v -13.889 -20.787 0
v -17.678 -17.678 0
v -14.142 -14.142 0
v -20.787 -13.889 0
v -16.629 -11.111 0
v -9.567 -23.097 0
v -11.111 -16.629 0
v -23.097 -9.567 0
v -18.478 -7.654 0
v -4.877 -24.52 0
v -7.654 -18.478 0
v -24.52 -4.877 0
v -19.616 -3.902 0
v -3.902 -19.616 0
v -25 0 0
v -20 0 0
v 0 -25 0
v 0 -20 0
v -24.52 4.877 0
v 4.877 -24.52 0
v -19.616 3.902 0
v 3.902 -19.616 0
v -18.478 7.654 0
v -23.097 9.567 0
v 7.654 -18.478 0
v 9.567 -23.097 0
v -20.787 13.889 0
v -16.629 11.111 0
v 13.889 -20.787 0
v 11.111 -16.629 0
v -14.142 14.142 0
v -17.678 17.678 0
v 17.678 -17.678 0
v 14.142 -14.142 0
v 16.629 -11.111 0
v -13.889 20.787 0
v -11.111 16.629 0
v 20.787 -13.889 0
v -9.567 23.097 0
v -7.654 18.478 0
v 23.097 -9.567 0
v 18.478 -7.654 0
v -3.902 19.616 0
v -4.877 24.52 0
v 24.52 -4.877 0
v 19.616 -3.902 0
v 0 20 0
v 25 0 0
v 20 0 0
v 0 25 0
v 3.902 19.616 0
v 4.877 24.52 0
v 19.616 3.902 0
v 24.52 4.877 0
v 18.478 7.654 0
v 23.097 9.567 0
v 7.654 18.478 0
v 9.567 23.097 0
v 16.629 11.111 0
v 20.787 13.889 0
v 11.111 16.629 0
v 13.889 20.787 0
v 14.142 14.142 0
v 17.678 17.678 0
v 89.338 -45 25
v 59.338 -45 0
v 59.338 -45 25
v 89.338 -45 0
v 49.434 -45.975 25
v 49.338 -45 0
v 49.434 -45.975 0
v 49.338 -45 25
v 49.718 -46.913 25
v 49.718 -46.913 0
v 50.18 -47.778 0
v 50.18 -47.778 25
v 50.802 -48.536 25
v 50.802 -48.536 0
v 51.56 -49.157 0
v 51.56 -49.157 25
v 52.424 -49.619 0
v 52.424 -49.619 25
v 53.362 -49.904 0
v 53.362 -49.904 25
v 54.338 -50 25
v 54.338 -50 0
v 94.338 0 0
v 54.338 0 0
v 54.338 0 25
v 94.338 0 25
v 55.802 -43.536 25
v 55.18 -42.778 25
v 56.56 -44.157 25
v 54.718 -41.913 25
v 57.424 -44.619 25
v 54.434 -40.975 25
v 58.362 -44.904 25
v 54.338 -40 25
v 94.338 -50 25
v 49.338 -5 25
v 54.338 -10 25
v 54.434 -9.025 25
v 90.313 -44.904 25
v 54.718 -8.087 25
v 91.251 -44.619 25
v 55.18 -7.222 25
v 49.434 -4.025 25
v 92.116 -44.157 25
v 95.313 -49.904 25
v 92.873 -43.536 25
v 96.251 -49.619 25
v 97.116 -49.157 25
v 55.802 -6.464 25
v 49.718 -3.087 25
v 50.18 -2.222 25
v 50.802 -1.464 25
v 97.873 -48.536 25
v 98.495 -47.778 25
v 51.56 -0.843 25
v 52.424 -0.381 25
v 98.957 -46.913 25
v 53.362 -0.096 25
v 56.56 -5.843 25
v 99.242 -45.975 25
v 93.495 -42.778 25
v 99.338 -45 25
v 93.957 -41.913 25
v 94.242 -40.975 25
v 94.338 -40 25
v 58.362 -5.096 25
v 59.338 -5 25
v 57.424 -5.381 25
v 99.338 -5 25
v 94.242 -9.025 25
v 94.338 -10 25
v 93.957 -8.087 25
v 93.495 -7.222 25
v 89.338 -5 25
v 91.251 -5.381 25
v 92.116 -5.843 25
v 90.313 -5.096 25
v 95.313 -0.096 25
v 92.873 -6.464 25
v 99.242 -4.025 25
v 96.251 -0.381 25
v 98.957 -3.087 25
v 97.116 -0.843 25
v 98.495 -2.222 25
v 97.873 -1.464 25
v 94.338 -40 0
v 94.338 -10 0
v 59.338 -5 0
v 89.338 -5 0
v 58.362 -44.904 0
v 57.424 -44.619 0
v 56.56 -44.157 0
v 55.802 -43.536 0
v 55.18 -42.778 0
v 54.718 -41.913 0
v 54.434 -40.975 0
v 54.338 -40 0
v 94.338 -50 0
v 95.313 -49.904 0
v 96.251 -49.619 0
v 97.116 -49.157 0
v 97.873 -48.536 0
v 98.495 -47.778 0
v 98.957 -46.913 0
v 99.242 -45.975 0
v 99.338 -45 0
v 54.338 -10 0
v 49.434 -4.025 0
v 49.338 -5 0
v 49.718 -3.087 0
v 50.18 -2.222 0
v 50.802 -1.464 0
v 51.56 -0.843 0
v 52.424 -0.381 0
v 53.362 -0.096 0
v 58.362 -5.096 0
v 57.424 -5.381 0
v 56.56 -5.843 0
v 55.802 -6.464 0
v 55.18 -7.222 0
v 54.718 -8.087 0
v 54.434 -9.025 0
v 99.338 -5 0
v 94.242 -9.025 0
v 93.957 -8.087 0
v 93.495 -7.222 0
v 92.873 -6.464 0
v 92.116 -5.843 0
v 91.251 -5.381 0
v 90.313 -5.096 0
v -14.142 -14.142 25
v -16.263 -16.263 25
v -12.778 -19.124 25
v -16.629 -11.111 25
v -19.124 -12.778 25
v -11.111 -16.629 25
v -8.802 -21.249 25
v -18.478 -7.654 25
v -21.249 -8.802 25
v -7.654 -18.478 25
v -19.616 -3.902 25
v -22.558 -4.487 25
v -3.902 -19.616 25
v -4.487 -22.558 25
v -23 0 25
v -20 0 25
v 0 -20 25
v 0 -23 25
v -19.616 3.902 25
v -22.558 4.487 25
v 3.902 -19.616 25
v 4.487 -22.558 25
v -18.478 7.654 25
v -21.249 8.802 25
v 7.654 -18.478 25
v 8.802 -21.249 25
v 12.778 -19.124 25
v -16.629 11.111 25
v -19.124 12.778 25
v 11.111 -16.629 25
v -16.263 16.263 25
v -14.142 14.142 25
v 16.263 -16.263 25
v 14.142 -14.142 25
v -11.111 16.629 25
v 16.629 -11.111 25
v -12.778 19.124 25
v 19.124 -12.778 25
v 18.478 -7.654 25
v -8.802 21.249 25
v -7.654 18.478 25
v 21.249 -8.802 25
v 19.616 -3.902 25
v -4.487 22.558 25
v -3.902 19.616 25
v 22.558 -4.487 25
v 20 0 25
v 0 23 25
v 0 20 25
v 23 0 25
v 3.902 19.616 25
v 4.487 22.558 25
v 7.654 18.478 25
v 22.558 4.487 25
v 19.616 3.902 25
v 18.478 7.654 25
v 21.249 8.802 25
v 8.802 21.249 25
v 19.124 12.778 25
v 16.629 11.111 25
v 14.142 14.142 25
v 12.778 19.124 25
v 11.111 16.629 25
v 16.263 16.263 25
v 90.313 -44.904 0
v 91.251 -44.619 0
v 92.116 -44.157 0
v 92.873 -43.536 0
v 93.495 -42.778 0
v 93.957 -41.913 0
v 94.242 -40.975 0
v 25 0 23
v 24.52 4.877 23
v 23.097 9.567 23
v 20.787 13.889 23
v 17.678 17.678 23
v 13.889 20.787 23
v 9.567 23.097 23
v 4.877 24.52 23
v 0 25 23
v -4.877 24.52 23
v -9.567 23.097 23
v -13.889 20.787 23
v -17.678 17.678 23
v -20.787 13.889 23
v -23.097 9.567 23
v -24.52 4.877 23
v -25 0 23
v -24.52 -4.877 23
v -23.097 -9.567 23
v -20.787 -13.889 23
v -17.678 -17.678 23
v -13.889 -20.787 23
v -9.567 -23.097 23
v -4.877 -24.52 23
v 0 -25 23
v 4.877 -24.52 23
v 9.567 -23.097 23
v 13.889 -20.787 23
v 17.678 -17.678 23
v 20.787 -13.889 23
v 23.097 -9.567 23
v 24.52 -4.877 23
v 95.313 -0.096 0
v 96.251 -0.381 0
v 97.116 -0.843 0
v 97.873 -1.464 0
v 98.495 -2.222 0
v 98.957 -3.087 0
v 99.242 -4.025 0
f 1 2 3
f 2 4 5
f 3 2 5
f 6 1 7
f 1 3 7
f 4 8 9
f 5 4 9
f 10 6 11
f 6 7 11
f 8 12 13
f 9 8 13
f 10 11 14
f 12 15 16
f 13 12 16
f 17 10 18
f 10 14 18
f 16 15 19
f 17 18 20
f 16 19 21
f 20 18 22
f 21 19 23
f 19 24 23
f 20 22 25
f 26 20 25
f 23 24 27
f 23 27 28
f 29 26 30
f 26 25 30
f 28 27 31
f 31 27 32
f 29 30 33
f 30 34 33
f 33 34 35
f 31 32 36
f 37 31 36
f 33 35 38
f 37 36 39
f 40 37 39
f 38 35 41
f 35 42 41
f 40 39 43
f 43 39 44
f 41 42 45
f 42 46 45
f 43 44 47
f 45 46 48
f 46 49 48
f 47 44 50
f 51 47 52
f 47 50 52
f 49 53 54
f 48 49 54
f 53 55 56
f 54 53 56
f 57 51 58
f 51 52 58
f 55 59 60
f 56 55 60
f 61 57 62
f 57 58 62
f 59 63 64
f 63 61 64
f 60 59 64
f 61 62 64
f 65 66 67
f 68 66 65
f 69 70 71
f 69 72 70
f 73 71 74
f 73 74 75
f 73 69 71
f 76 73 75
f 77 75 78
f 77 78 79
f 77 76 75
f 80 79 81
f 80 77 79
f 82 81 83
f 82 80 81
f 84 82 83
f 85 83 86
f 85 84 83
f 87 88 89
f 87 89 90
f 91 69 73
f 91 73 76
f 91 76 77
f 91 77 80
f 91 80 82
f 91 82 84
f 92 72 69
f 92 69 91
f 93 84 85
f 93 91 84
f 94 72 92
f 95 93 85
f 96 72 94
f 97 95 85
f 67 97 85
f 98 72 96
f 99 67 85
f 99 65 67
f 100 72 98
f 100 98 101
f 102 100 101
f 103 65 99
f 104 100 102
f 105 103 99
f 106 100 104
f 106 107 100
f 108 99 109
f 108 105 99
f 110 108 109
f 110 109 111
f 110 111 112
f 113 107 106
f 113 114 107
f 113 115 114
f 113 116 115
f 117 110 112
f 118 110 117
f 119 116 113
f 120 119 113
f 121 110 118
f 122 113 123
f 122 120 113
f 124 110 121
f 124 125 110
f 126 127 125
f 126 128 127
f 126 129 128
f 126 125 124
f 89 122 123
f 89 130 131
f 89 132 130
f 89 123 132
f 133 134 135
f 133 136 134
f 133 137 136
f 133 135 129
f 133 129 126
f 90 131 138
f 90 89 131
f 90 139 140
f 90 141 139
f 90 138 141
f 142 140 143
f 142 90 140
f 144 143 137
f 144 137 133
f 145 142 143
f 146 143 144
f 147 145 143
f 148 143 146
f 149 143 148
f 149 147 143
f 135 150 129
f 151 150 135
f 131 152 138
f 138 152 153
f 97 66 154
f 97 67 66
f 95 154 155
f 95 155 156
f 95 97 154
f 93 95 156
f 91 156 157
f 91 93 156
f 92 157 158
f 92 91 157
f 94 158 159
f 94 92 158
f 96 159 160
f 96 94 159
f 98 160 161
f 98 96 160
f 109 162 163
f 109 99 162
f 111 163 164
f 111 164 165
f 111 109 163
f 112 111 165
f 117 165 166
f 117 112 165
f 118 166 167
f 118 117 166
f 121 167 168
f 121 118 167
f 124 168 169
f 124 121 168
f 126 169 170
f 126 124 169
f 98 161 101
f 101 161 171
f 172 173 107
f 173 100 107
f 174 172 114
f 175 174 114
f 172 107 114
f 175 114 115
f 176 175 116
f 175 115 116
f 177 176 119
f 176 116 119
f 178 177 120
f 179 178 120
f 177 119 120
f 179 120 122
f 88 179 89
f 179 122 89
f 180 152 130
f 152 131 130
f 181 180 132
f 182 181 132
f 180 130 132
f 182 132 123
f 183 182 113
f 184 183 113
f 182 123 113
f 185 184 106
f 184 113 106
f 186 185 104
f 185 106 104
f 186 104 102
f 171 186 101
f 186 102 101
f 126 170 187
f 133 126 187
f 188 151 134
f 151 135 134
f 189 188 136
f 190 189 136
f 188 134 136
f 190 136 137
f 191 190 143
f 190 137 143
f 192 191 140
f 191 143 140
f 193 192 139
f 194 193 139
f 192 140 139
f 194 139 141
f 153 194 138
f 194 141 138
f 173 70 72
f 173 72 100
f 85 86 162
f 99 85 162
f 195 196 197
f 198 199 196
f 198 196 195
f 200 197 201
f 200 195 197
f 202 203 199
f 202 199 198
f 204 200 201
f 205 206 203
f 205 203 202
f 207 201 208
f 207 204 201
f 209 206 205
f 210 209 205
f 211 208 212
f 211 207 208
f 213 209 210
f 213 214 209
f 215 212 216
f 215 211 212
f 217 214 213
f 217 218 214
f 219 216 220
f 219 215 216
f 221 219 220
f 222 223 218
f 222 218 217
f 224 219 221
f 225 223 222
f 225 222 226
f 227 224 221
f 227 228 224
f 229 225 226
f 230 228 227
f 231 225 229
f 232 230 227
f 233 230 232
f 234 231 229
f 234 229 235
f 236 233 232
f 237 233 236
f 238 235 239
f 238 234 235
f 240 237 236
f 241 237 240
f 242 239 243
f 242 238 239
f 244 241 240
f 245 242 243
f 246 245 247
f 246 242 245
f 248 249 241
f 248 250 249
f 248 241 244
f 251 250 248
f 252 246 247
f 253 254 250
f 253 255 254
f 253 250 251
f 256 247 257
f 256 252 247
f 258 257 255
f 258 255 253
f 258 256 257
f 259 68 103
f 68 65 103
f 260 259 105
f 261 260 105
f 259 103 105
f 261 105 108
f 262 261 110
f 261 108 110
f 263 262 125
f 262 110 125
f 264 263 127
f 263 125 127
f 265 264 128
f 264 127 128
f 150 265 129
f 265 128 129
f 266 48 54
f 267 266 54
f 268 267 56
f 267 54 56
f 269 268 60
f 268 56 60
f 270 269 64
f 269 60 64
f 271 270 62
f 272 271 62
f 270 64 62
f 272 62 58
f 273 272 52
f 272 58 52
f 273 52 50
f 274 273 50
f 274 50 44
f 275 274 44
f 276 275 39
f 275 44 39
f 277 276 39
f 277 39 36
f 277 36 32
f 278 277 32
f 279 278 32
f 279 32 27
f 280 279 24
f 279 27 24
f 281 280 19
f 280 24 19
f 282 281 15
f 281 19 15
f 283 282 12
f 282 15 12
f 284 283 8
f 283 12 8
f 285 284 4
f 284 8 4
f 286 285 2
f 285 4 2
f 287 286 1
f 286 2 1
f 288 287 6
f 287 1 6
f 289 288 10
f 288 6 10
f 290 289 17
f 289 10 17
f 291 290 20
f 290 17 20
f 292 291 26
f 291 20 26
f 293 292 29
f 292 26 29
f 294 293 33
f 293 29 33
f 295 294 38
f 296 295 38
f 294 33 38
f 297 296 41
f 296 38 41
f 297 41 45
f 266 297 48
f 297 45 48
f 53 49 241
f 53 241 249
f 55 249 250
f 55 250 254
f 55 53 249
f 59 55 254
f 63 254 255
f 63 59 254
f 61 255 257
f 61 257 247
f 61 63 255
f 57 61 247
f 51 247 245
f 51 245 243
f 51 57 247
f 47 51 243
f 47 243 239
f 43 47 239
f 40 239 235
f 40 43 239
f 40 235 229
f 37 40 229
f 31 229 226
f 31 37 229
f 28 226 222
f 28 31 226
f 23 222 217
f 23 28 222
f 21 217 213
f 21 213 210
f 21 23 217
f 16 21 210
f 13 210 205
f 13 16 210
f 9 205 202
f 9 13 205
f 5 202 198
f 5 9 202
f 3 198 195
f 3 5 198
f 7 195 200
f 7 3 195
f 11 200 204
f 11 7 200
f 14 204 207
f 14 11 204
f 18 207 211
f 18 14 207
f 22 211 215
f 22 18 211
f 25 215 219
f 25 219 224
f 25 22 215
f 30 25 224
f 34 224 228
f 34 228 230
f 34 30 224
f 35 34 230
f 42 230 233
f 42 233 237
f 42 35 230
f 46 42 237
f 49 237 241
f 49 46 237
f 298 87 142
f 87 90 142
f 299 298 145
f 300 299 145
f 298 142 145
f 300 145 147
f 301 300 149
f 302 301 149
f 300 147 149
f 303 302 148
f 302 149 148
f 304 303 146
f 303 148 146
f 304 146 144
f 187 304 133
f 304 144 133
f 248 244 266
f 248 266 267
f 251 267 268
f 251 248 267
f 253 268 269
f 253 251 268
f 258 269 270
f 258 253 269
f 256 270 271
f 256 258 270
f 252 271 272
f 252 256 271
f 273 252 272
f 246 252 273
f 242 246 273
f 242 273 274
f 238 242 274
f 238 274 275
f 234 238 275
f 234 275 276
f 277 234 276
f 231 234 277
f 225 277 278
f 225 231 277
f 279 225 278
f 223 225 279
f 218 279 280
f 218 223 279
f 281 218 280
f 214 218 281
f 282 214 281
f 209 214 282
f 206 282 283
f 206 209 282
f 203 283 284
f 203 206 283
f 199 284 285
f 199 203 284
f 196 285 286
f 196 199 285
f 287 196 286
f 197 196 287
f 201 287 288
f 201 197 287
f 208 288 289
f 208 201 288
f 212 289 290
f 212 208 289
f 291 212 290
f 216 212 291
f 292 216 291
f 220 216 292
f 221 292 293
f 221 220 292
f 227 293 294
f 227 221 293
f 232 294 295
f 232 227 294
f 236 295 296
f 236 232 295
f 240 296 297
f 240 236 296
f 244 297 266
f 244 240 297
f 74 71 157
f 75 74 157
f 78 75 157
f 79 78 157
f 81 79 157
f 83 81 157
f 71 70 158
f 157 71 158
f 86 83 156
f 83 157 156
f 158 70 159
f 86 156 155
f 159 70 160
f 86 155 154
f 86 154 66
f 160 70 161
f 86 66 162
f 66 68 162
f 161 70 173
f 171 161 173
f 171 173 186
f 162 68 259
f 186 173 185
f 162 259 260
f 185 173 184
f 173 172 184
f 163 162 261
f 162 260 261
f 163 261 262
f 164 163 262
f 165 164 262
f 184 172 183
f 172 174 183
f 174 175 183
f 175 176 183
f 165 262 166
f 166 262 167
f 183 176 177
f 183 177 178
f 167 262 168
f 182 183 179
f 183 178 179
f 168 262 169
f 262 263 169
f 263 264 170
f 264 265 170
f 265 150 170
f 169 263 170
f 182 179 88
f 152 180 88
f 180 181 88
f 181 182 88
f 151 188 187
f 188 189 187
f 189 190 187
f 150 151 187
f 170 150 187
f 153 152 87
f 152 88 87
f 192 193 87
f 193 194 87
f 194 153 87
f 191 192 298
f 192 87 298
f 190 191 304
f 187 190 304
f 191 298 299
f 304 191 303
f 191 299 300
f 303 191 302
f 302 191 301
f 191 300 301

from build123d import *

# Parameters (mm, degrees)
F0_R     = 25
F0_R_2   = 20
F1_DEPTH = 25
F2_W     = 50
F2_H     = 50
F2_W_2   = 40
F2_H_2   = 40
F3_DEPTH = 25
F4_R     = 5
F5_SIZE  = 2


with BuildPart() as f1:
    # F0 (on Top) → F1 (new body)
    with BuildSketch(Plane.XY):
        Circle(F0_R)
        Circle(F0_R_2, mode=Mode.SUBTRACT)
    extrude(amount=F1_DEPTH)

    # F5
    f5_edges = [f1.edges().sort_by_distance(p)[0] for p in [
        (-25, 0, 25),
    ]]
    chamfer(f5_edges, length=F5_SIZE)


with BuildPart() as f3:
    # F2 (on Top) → F3 (new body)
    with BuildSketch(Plane.XY):
        with Locations((74.337745, -25)):
            Rectangle(F2_W, F2_H)
        with Locations((74.337745, -25)):
            Rectangle(F2_W_2, F2_H_2, mode=Mode.SUBTRACT)
    extrude(amount=F3_DEPTH)

    # F4
    f4_edges = [f3.edges().sort_by_distance(p)[0] for p in [
        (54.337745, -5, 12.5),
        (54.337745, -45, 12.5),
        (94.337745, -5, 12.5),
        (94.337745, -45, 12.5),
        (49.337745, 0, 12.5),
        (99.337745, 0, 12.5),
        (49.337745, -50, 12.5),
        (99.337745, -50, 12.5),
    ]]
    fillet(f4_edges, radius=F4_R)


solid = Compound([f1.part, f3.part])
